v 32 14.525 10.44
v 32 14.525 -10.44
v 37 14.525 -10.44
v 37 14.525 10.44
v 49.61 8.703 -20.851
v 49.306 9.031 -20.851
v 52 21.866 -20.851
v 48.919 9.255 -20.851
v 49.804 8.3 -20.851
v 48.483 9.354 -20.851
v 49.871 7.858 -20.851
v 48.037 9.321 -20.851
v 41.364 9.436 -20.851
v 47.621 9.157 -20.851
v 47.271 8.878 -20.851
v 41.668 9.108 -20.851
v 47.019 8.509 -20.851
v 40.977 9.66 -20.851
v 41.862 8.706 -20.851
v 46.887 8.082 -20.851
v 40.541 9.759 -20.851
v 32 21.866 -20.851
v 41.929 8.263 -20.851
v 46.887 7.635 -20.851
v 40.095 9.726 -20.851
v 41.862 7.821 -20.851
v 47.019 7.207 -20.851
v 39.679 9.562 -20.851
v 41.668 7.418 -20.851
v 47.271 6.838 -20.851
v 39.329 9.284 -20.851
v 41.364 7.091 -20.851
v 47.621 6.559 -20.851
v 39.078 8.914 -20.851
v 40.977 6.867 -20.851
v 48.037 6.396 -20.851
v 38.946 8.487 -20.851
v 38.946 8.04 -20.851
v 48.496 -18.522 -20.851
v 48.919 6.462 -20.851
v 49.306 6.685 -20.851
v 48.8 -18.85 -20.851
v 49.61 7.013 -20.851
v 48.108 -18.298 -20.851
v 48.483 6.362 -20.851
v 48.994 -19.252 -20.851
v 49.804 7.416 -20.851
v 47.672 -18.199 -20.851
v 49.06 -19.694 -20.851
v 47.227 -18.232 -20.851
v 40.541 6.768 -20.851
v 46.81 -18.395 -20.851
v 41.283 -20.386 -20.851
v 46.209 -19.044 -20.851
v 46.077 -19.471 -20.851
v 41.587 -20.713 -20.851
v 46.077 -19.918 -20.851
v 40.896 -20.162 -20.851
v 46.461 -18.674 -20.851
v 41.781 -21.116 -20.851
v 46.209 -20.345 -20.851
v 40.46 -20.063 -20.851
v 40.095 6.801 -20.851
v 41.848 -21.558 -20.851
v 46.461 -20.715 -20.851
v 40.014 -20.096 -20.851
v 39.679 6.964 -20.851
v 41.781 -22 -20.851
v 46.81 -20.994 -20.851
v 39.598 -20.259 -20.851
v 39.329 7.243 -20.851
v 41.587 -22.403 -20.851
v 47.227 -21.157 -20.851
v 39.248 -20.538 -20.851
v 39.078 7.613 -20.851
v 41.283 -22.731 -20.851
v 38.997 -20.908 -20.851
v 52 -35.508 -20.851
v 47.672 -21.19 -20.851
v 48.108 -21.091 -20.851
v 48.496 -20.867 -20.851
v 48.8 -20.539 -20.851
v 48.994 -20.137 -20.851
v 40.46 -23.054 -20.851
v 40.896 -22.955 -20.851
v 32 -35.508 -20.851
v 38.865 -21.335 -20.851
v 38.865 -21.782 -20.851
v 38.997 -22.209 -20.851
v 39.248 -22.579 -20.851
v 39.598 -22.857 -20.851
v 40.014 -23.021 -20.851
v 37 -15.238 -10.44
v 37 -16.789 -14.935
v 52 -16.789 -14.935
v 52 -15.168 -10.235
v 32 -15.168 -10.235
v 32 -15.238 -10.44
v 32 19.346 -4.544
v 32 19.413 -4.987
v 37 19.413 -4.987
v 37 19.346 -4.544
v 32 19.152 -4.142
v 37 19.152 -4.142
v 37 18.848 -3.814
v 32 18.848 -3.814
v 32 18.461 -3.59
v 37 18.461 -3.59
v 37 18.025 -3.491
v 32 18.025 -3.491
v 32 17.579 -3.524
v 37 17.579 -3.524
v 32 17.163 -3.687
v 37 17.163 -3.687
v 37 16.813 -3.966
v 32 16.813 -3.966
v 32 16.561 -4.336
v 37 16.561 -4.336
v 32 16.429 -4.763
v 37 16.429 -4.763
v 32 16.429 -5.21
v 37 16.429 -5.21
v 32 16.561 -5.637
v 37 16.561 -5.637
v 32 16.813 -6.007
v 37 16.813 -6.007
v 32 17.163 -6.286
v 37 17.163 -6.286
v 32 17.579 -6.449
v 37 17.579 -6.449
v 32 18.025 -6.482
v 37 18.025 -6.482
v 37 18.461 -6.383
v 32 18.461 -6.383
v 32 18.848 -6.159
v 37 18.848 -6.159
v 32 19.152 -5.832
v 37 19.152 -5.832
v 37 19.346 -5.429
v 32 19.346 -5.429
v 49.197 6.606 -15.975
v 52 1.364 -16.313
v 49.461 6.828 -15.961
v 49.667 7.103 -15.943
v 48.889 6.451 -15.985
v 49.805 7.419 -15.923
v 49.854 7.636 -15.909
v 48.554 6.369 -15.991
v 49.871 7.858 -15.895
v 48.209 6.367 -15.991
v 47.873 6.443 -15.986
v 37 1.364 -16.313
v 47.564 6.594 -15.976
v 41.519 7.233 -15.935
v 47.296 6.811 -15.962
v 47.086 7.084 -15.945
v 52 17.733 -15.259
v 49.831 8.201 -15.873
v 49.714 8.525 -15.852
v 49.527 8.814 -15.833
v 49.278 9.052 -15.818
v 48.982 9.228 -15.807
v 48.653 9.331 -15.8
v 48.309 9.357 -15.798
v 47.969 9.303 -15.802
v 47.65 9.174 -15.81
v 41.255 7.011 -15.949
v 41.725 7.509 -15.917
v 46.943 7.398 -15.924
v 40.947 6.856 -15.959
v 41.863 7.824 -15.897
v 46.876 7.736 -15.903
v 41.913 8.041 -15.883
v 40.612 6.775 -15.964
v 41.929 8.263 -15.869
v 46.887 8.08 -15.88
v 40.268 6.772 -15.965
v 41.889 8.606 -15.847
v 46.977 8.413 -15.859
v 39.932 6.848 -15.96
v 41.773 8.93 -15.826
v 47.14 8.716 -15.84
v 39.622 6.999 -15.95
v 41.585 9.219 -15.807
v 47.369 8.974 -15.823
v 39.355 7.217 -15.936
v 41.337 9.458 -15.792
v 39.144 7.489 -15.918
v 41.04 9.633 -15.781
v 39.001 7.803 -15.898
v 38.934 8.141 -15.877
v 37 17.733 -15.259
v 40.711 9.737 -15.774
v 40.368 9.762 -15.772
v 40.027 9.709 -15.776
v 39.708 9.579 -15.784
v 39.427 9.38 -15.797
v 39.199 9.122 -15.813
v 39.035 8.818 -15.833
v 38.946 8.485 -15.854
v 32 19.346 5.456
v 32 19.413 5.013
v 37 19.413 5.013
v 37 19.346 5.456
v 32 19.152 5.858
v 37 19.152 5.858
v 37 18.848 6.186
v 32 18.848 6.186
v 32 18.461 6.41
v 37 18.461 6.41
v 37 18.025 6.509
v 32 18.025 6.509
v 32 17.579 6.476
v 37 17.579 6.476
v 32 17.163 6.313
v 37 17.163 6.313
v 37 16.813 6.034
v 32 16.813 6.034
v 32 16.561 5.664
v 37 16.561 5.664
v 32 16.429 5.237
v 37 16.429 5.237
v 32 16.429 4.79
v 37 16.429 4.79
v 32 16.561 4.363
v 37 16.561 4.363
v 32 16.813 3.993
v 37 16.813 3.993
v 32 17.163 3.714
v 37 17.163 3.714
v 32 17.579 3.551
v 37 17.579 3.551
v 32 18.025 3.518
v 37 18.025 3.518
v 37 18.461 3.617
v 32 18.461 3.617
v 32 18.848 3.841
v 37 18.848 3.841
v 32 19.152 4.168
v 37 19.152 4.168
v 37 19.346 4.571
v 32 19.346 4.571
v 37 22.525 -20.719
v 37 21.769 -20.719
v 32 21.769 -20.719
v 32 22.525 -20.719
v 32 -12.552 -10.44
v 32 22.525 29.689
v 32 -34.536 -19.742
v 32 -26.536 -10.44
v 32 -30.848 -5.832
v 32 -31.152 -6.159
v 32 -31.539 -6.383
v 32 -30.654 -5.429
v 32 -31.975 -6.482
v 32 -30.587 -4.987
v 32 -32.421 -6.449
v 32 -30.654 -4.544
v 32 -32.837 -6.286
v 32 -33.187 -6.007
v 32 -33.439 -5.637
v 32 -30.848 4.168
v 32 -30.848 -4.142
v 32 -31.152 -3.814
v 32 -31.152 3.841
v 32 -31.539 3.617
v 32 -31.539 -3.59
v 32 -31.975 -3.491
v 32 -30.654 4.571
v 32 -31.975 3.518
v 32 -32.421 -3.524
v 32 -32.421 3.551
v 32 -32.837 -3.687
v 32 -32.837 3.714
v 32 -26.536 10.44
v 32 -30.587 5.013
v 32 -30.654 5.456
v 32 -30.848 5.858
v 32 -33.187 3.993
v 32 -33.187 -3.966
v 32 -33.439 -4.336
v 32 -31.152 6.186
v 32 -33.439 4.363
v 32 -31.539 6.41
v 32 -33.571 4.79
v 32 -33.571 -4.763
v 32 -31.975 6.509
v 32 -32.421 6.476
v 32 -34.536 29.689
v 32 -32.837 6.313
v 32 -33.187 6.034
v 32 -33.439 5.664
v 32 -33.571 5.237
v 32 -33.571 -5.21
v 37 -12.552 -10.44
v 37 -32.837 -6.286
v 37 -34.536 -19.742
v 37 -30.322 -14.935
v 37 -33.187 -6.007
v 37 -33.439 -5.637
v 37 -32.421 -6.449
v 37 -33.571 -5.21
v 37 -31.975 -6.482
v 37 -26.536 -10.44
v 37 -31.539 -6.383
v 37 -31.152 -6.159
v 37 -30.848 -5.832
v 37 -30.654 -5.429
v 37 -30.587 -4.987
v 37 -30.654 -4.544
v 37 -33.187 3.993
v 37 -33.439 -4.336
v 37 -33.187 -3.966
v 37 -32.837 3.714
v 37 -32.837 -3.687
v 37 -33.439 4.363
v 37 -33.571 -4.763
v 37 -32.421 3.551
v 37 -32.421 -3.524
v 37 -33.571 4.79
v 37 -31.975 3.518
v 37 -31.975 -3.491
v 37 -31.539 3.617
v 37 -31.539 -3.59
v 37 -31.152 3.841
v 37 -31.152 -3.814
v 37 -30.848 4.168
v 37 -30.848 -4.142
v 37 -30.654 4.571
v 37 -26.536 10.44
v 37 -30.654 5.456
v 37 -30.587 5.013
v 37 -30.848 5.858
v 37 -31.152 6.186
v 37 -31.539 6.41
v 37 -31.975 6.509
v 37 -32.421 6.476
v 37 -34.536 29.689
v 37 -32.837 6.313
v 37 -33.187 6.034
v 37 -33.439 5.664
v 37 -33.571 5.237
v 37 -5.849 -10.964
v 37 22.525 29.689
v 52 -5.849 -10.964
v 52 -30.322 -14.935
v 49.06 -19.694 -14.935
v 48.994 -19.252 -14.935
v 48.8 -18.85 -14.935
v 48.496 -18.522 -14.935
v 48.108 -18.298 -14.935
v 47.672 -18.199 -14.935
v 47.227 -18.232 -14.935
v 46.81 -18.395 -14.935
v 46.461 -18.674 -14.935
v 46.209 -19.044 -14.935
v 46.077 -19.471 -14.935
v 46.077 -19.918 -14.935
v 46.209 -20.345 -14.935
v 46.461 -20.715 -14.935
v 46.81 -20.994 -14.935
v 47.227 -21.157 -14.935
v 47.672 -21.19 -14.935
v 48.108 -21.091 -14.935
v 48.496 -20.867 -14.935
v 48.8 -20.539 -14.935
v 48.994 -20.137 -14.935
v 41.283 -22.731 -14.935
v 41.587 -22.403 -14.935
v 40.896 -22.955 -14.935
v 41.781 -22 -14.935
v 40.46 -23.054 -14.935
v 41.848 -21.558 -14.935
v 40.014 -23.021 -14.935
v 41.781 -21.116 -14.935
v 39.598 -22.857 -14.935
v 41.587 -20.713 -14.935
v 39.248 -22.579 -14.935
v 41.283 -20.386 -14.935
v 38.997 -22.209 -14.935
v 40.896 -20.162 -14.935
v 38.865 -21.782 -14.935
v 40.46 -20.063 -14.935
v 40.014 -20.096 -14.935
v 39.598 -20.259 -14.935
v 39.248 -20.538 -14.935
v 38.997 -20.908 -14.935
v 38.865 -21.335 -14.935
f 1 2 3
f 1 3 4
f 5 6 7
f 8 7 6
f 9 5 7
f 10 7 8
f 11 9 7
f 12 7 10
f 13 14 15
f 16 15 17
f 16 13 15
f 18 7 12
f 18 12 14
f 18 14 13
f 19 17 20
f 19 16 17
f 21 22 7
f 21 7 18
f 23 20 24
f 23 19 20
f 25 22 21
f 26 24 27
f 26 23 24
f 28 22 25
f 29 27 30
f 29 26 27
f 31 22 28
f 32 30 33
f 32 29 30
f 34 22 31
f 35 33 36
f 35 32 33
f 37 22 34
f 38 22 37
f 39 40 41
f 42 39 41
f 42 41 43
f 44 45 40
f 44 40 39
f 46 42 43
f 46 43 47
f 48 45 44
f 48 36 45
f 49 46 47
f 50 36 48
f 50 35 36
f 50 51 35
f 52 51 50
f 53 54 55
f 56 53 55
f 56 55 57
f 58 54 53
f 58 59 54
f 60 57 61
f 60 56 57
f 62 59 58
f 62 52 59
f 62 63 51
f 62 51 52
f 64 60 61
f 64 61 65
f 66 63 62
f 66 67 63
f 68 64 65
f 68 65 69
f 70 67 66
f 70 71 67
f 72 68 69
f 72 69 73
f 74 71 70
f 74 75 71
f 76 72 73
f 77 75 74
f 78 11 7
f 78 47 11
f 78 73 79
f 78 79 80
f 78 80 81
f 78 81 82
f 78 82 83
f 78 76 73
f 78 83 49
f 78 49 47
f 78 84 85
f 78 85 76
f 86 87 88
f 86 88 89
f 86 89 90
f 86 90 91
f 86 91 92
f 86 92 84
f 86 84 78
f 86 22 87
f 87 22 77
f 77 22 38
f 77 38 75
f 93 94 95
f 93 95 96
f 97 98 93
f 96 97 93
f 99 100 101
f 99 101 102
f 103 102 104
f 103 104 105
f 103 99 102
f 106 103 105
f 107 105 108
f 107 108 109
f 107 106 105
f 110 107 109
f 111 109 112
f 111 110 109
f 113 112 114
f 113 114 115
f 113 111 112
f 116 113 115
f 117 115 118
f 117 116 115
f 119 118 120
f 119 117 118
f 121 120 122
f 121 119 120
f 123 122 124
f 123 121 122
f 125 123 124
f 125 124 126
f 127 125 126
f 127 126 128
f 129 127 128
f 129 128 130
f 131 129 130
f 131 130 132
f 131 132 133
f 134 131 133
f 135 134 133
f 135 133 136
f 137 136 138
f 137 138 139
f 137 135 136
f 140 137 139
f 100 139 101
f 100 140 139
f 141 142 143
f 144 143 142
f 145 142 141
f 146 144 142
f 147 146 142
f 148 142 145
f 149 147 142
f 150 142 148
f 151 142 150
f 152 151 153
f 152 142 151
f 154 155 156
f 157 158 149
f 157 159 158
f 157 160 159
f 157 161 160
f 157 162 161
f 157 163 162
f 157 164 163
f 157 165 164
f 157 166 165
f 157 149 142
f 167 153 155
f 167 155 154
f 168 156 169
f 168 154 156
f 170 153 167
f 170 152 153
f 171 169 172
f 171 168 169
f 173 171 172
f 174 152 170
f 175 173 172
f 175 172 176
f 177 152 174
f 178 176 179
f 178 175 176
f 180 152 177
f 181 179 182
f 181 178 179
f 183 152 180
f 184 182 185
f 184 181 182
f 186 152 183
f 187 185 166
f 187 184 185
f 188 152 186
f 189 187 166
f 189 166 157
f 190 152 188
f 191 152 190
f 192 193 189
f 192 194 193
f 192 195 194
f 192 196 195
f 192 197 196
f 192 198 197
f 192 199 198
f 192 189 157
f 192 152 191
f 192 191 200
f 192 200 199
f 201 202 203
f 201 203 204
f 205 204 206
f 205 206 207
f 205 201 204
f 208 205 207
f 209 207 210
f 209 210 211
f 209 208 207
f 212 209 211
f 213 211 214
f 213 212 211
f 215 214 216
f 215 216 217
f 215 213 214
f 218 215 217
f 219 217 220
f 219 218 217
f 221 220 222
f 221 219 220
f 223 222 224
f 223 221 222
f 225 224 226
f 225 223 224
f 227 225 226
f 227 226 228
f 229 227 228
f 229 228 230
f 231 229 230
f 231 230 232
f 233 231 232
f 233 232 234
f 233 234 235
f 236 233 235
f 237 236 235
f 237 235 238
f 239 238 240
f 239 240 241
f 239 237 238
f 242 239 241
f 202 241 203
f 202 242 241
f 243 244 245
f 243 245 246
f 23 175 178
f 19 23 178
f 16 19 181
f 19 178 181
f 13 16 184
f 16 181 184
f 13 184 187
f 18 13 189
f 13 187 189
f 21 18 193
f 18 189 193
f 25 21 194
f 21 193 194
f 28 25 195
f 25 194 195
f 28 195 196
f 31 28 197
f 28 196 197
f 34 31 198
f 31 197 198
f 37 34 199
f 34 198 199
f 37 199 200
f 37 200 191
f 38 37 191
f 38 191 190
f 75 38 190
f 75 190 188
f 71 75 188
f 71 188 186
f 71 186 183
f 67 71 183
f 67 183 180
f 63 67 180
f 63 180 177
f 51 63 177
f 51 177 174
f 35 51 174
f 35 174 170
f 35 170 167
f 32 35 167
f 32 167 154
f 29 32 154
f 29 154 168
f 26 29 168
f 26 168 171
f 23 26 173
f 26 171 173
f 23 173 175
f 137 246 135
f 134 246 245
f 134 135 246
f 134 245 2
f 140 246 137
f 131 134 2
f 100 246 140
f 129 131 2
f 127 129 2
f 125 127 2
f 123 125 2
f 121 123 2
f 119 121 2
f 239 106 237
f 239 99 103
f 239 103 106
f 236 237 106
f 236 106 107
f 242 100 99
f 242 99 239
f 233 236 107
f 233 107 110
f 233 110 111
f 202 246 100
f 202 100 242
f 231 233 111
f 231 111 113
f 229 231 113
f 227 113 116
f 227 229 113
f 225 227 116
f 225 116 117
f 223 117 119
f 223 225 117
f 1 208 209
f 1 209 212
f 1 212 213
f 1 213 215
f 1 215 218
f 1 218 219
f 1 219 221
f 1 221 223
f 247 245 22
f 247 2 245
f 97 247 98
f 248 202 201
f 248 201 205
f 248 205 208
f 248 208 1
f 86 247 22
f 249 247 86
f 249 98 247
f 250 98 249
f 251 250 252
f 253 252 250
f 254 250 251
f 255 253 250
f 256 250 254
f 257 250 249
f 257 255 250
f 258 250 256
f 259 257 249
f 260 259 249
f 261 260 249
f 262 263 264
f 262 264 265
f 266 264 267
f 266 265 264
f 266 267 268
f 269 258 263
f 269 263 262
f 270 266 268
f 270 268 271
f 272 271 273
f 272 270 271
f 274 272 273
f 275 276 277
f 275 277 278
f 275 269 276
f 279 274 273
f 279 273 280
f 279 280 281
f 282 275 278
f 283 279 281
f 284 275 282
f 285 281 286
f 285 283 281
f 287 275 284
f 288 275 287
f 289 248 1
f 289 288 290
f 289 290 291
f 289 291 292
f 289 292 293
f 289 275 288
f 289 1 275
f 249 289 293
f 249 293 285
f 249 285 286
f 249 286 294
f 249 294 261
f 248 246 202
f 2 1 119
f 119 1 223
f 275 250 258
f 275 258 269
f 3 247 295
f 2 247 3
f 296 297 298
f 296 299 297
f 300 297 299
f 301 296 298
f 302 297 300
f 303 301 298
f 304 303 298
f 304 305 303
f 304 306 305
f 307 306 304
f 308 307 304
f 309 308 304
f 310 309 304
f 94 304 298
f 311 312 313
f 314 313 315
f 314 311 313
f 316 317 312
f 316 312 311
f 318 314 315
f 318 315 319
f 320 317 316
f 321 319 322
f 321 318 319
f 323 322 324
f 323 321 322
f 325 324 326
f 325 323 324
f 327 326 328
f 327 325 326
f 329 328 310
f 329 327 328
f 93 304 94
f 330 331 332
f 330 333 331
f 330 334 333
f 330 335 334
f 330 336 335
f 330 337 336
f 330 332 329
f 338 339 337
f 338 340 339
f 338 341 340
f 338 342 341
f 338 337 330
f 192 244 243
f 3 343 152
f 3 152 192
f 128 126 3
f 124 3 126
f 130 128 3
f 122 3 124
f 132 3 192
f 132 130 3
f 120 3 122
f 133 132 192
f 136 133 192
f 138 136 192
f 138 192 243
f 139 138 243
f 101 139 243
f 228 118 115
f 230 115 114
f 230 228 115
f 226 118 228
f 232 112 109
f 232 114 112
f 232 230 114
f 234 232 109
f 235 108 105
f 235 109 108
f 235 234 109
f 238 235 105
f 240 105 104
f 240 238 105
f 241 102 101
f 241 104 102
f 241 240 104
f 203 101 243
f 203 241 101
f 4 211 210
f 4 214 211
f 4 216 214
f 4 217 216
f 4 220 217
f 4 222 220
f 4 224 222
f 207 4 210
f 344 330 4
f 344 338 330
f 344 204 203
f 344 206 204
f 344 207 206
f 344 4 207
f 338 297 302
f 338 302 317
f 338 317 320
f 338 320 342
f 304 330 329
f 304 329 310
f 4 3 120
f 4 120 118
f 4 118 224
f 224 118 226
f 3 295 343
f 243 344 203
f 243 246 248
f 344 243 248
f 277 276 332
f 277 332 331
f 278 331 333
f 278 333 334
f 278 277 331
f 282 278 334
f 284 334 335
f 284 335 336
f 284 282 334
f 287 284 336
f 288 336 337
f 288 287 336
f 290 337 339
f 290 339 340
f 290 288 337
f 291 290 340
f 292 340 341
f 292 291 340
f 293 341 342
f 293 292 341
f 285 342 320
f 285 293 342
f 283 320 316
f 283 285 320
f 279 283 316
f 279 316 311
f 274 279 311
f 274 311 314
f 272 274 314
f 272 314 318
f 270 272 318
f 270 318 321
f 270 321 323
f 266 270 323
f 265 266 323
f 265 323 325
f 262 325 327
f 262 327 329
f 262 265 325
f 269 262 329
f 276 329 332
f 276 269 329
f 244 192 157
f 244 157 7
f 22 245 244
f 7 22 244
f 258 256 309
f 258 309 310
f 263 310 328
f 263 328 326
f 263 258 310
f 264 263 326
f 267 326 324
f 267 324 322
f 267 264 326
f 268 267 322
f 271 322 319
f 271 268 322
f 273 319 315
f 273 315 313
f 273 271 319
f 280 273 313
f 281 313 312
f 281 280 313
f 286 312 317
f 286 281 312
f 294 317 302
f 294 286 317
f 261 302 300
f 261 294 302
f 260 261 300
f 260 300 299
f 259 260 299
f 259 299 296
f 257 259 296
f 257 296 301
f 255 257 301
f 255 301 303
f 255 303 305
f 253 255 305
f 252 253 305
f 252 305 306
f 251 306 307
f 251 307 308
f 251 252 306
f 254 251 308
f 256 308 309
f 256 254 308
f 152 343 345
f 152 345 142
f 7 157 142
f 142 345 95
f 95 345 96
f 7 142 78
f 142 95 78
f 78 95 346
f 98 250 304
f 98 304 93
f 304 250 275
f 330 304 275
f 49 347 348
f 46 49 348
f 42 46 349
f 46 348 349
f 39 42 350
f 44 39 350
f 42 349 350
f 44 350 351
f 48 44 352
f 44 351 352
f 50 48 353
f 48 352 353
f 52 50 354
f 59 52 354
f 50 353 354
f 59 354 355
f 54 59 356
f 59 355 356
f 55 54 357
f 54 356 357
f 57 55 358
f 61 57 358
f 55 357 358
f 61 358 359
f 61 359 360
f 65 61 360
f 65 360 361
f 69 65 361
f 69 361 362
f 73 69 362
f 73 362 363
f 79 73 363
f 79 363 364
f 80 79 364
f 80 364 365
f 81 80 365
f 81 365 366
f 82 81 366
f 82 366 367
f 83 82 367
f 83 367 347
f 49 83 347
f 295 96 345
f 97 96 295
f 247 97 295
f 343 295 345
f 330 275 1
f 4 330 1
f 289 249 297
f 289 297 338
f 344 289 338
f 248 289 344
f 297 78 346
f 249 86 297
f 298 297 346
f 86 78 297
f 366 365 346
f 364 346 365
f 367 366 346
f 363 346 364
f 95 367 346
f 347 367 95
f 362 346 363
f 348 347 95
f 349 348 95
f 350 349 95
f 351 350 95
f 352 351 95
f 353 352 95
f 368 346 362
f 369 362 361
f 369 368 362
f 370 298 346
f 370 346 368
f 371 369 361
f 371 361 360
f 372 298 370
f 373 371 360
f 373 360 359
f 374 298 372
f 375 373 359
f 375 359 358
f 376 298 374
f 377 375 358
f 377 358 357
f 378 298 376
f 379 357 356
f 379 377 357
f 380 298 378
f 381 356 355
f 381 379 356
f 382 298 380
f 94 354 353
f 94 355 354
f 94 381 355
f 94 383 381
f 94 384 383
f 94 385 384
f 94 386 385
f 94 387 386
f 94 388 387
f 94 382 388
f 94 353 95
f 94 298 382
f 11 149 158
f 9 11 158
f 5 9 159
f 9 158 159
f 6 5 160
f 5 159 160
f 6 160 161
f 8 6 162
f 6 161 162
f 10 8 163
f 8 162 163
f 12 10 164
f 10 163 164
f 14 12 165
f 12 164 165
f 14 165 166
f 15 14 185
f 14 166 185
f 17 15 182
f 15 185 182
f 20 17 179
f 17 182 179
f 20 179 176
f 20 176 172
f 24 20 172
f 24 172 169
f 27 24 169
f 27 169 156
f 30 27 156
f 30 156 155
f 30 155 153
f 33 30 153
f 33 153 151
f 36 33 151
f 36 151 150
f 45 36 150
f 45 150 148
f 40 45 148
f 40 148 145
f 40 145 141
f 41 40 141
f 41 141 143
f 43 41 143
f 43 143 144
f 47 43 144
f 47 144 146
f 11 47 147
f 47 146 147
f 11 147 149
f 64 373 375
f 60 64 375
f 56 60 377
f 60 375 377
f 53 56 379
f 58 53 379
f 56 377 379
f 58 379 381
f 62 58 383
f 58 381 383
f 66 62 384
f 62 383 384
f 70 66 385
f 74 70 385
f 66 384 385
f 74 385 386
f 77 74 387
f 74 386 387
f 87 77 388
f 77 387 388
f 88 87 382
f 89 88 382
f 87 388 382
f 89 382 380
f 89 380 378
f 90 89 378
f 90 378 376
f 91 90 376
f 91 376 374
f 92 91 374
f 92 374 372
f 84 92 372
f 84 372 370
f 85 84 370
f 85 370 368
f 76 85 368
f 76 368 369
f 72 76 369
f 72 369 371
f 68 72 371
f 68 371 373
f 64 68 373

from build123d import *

# Parameters (mm, degrees)
SKETCH010_R   = 1.5
PAD006_DEPTH  = 100
PAD005_DEPTH  = 20
SKETCH008_W   = 57.061168
SKETCH008_H   = 50.408328
SKETCH008_R   = 1.5
SKETCH008_W_2 = 41.061168
SKETCH008_H_2 = 20.879282
PAD004_DEPTH  = 5


with BuildPart() as screwcutouts:
    # Sketch010 → Pad006 (new body)
    with BuildSketch(Plane.XY):
        with Locations((40.429066, 8.263429)):
            Circle(SKETCH010_R)
        with Locations((48.370731, 7.858237)):
            Circle(SKETCH010_R)
        with Locations((40.348022, -21.55835)):
            Circle(SKETCH010_R)
        with Locations((47.560356, -19.694489)):
            Circle(SKETCH010_R)
    extrude(amount=-PAD006_DEPTH)


with BuildPart() as mountsupportpad:
    # Sketch009 → Pad005 (new body)
    with BuildSketch(Plane.YZ.offset(32)):
        Polygon((-35.508293, -20.850826), (-30.321894, -14.935085), (-16.788631, -14.935085), (-15.16788, -10.234911), (-5.848567, -10.964246), (1.363771, -16.312723), (17.733341, -15.259238), (21.866251, -20.850826), align=None)
    extrude(amount=PAD005_DEPTH)


with BuildPart() as cut003:
    # Sketch008 → Pad004 (new body)
    with BuildSketch(Plane.YZ.offset(32)):
        with Locations((-6.005477, 4.48483)):
            Rectangle(SKETCH008_W, SKETCH008_H)
        with Locations((-32.087313, 5.013472)):
            Circle(SKETCH008_R, mode=Mode.SUBTRACT)
        with Locations((-32.087313, -4.986528)):
            Circle(SKETCH008_R, mode=Mode.SUBTRACT)
        with Locations((17.912687, 5.013472)):
            Circle(SKETCH008_R, mode=Mode.SUBTRACT)
        with Locations((17.912687, -4.986528)):
            Circle(SKETCH008_R, mode=Mode.SUBTRACT)
        with Locations((-6.005477, 0)):
            Rectangle(SKETCH008_W_2, SKETCH008_H_2, mode=Mode.SUBTRACT)
    extrude(amount=PAD004_DEPTH)

    # Fusion003: union MountSupportPad
    add(mountsupportpad.part)

    # Cut003: cut ScrewCutouts
    add(screwcutouts.part, mode=Mode.SUBTRACT)


solid = cut003.part
